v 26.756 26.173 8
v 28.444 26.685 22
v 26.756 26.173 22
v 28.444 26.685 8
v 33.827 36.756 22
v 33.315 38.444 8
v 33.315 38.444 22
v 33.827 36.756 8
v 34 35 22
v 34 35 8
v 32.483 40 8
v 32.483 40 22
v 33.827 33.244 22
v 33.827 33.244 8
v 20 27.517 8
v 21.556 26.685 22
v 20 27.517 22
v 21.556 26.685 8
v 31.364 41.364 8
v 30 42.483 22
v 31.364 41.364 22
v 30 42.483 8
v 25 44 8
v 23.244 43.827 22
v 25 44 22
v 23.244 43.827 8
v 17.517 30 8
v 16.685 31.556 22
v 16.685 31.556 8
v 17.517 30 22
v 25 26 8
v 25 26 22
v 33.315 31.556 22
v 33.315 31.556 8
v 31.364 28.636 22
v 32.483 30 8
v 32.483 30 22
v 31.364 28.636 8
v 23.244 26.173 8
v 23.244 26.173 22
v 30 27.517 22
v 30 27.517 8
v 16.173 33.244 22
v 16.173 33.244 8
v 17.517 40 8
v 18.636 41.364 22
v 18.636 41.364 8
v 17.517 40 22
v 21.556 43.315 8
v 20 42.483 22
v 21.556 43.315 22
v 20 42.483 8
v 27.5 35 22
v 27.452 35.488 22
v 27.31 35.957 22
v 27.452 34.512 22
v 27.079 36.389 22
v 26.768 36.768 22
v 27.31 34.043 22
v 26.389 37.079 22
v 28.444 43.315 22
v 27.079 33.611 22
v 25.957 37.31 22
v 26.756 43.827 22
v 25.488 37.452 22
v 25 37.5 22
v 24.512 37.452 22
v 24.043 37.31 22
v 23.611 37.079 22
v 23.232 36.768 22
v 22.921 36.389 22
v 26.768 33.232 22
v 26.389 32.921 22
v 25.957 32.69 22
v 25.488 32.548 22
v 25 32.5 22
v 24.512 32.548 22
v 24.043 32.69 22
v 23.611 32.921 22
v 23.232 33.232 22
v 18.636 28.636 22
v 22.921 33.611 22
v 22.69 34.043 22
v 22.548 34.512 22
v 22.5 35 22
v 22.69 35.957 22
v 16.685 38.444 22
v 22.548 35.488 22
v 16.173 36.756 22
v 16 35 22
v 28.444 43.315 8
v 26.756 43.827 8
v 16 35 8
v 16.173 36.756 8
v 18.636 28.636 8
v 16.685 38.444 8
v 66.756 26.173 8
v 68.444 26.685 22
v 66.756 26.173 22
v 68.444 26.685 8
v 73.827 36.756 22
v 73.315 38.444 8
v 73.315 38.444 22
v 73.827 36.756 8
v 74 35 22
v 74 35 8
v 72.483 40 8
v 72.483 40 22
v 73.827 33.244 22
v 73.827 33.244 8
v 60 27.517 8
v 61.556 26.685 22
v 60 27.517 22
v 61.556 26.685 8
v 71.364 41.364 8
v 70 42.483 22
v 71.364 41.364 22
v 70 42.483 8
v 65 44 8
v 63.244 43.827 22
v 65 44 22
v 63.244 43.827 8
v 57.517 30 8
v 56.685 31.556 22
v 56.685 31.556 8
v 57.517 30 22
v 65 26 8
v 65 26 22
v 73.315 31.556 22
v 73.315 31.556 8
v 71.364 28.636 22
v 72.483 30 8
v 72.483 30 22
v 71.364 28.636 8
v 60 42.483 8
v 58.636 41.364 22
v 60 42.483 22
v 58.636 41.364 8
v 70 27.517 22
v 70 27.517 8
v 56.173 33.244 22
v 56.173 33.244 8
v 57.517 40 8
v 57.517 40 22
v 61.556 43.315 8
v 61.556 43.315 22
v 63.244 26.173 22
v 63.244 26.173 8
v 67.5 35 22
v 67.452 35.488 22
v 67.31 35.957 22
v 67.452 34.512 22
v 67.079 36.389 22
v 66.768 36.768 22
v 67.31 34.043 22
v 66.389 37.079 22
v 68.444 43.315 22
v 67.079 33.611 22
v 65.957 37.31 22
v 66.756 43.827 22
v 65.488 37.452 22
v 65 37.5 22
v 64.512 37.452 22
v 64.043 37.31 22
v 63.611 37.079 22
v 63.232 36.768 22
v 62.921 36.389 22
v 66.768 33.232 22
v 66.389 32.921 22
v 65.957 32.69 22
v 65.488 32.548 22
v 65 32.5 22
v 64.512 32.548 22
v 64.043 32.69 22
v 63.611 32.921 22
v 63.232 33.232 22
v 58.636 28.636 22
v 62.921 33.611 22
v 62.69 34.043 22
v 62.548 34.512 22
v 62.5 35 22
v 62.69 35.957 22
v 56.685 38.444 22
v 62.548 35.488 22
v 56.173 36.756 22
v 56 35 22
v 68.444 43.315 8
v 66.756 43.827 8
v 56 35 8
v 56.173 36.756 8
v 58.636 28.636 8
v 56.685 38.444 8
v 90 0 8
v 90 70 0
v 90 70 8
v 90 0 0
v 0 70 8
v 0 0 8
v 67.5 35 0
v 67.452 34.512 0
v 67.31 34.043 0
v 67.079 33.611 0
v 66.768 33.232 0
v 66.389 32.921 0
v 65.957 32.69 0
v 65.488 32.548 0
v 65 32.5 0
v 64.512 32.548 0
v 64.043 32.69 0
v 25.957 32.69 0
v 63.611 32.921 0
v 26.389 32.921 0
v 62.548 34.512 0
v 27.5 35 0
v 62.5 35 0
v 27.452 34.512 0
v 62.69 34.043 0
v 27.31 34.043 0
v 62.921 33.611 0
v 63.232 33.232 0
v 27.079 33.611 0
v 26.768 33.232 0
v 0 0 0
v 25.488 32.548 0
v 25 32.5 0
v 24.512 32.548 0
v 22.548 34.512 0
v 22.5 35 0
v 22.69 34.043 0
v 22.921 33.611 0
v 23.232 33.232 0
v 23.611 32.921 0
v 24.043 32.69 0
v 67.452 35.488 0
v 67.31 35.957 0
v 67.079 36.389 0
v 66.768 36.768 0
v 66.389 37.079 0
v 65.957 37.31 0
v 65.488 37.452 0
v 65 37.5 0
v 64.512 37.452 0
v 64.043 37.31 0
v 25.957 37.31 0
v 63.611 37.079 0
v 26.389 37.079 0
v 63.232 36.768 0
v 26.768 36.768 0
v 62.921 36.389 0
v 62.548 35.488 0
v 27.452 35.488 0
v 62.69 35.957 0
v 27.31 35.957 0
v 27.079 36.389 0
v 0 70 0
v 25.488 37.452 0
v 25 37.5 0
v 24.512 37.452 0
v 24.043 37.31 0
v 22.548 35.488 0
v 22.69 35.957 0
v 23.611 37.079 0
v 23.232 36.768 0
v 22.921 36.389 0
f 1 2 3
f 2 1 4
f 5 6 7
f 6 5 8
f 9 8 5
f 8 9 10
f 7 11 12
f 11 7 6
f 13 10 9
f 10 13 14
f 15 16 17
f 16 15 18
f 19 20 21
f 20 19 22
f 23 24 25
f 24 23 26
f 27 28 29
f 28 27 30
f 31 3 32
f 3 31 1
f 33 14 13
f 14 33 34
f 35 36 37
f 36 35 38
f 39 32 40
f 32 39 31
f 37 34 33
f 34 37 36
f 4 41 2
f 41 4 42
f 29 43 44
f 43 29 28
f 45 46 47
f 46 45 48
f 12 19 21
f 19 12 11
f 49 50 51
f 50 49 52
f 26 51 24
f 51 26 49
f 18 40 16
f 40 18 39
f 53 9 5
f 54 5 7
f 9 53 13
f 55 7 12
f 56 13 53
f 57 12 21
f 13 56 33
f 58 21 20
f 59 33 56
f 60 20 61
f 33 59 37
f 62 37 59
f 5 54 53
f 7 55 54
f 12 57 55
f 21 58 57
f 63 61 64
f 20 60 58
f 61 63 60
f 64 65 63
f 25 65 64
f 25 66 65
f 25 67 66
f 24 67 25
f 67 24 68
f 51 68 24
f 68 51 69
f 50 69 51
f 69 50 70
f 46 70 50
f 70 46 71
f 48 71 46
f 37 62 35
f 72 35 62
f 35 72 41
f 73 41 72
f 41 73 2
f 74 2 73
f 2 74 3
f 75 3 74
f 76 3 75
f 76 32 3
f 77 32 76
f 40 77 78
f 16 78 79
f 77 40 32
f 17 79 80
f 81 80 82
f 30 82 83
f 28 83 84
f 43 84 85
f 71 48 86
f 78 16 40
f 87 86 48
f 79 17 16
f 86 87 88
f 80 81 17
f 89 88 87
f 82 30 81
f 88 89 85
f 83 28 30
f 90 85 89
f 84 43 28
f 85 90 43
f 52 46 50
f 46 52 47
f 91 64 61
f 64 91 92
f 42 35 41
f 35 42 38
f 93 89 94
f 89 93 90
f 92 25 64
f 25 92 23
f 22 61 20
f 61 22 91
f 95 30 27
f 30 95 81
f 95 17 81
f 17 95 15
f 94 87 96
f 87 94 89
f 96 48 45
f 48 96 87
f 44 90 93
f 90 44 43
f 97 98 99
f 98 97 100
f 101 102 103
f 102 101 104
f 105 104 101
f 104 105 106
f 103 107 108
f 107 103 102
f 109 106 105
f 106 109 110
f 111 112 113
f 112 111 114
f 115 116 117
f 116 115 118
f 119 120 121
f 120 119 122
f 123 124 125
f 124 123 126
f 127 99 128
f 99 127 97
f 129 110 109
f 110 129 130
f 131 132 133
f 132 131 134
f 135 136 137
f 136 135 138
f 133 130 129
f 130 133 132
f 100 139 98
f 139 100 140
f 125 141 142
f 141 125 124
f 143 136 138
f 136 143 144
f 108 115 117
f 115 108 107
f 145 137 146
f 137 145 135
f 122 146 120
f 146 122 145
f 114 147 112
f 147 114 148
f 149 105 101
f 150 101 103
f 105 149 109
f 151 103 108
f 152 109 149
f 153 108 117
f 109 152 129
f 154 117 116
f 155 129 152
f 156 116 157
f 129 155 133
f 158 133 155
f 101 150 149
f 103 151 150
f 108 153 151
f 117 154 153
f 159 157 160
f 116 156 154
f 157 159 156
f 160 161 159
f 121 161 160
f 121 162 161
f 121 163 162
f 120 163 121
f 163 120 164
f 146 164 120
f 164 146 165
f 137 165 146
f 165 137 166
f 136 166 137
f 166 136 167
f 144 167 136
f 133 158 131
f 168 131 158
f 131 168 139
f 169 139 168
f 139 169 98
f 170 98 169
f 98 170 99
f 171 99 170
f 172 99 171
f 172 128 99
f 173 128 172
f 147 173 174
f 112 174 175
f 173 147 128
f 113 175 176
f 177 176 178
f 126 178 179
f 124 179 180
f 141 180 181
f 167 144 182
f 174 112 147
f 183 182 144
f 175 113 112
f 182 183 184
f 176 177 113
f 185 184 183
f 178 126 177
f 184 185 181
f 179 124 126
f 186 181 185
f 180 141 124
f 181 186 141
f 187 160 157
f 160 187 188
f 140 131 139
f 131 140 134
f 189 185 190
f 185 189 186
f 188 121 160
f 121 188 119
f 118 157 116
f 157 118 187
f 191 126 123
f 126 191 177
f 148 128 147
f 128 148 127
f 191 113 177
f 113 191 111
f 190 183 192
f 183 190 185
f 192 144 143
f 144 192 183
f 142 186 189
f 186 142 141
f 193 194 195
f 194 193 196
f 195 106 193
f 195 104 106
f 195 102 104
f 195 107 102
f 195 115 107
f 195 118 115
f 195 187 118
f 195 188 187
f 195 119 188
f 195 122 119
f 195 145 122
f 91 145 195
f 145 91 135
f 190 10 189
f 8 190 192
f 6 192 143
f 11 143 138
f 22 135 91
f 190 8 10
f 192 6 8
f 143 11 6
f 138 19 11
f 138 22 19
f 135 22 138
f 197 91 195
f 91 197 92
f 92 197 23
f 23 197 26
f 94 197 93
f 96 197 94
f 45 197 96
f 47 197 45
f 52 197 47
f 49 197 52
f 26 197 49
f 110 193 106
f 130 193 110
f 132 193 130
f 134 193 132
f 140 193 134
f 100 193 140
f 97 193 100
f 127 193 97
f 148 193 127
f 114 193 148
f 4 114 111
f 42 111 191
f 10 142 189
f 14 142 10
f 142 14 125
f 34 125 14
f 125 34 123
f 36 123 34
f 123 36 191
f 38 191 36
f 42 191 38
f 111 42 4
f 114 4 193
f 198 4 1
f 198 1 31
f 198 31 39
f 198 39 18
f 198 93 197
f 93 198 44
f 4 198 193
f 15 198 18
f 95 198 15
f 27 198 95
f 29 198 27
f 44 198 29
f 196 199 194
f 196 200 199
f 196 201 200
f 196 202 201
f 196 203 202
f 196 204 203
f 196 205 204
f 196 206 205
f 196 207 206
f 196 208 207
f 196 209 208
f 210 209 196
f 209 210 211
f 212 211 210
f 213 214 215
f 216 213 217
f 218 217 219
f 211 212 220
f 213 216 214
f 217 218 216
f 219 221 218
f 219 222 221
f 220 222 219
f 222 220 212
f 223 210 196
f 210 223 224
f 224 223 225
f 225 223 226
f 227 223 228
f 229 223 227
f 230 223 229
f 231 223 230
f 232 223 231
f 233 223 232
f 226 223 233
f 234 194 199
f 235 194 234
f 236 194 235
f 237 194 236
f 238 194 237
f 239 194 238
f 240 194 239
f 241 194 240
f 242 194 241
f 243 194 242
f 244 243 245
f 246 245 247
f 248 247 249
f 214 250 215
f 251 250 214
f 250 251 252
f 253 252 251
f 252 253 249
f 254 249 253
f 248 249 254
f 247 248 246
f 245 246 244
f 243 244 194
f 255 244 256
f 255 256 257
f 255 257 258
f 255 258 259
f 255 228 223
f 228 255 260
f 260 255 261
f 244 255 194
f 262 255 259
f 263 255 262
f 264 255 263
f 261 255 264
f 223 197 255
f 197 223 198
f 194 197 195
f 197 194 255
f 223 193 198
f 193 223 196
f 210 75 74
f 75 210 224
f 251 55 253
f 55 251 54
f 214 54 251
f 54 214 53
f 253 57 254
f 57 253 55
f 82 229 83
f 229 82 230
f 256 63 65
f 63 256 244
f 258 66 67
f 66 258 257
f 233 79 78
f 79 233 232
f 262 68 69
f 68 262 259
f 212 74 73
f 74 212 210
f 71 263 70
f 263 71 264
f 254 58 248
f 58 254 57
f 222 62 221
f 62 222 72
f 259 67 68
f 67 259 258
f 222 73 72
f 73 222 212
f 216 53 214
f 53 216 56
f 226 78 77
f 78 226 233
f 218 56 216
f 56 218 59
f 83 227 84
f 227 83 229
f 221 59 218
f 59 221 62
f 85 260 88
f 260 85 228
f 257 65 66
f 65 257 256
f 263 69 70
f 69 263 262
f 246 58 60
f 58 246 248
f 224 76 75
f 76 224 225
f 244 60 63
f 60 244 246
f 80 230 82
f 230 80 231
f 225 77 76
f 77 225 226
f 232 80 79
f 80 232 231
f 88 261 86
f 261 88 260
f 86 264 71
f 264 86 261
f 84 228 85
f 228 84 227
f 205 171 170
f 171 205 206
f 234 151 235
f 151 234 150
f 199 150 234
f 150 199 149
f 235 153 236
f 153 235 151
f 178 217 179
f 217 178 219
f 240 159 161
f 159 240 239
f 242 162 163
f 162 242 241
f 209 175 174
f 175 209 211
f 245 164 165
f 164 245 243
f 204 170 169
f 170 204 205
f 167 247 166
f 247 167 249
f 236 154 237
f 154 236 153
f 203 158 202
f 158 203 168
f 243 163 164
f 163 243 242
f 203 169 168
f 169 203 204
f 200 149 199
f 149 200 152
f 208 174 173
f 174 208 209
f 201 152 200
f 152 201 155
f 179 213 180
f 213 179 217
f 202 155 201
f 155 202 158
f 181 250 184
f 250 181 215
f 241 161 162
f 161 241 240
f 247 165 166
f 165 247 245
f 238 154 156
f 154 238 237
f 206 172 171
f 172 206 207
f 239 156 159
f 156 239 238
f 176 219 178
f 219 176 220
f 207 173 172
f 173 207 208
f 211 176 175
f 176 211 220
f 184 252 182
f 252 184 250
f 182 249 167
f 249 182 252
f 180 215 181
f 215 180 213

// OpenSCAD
$fn = 32;

// ----------------------------------------------------------------------
// Drill jig: two_boss jig
// ----------------------------------------------------------------------

// --- parameters (mm) ---
plate_l = 90;             // plate length, X
plate_w = 70;             // plate width, Y
plate_t = 8;              // plate thickness
boss_d = 18;              // guide boss diameter
boss_h = 15;              // boss height above the plate
guide_d = 5;              // guide hole diameter
boss_pitch = 40;          // boss pitch

n_boss = 2;  // guide bosses
boss_x0 = (plate_l - (n_boss - 1) * boss_pitch) / 2;  // first boss X
boss_top = plate_t - 1 + boss_h;  // boss crown height
total_h = boss_top;  // overall height

difference() {
  union() {
  cube([plate_l, plate_w, plate_t]);
  for (i = [0 : n_boss - 1])
    translate([boss_x0 + i * boss_pitch, plate_w / 2, plate_t - 1])
      cylinder(h = boss_h, d = boss_d);
  }
  for (i = [0 : n_boss - 1])
    translate([boss_x0 + i * boss_pitch, plate_w / 2, -1])
      cylinder(h = plate_t + boss_h, d = guide_d);
}
